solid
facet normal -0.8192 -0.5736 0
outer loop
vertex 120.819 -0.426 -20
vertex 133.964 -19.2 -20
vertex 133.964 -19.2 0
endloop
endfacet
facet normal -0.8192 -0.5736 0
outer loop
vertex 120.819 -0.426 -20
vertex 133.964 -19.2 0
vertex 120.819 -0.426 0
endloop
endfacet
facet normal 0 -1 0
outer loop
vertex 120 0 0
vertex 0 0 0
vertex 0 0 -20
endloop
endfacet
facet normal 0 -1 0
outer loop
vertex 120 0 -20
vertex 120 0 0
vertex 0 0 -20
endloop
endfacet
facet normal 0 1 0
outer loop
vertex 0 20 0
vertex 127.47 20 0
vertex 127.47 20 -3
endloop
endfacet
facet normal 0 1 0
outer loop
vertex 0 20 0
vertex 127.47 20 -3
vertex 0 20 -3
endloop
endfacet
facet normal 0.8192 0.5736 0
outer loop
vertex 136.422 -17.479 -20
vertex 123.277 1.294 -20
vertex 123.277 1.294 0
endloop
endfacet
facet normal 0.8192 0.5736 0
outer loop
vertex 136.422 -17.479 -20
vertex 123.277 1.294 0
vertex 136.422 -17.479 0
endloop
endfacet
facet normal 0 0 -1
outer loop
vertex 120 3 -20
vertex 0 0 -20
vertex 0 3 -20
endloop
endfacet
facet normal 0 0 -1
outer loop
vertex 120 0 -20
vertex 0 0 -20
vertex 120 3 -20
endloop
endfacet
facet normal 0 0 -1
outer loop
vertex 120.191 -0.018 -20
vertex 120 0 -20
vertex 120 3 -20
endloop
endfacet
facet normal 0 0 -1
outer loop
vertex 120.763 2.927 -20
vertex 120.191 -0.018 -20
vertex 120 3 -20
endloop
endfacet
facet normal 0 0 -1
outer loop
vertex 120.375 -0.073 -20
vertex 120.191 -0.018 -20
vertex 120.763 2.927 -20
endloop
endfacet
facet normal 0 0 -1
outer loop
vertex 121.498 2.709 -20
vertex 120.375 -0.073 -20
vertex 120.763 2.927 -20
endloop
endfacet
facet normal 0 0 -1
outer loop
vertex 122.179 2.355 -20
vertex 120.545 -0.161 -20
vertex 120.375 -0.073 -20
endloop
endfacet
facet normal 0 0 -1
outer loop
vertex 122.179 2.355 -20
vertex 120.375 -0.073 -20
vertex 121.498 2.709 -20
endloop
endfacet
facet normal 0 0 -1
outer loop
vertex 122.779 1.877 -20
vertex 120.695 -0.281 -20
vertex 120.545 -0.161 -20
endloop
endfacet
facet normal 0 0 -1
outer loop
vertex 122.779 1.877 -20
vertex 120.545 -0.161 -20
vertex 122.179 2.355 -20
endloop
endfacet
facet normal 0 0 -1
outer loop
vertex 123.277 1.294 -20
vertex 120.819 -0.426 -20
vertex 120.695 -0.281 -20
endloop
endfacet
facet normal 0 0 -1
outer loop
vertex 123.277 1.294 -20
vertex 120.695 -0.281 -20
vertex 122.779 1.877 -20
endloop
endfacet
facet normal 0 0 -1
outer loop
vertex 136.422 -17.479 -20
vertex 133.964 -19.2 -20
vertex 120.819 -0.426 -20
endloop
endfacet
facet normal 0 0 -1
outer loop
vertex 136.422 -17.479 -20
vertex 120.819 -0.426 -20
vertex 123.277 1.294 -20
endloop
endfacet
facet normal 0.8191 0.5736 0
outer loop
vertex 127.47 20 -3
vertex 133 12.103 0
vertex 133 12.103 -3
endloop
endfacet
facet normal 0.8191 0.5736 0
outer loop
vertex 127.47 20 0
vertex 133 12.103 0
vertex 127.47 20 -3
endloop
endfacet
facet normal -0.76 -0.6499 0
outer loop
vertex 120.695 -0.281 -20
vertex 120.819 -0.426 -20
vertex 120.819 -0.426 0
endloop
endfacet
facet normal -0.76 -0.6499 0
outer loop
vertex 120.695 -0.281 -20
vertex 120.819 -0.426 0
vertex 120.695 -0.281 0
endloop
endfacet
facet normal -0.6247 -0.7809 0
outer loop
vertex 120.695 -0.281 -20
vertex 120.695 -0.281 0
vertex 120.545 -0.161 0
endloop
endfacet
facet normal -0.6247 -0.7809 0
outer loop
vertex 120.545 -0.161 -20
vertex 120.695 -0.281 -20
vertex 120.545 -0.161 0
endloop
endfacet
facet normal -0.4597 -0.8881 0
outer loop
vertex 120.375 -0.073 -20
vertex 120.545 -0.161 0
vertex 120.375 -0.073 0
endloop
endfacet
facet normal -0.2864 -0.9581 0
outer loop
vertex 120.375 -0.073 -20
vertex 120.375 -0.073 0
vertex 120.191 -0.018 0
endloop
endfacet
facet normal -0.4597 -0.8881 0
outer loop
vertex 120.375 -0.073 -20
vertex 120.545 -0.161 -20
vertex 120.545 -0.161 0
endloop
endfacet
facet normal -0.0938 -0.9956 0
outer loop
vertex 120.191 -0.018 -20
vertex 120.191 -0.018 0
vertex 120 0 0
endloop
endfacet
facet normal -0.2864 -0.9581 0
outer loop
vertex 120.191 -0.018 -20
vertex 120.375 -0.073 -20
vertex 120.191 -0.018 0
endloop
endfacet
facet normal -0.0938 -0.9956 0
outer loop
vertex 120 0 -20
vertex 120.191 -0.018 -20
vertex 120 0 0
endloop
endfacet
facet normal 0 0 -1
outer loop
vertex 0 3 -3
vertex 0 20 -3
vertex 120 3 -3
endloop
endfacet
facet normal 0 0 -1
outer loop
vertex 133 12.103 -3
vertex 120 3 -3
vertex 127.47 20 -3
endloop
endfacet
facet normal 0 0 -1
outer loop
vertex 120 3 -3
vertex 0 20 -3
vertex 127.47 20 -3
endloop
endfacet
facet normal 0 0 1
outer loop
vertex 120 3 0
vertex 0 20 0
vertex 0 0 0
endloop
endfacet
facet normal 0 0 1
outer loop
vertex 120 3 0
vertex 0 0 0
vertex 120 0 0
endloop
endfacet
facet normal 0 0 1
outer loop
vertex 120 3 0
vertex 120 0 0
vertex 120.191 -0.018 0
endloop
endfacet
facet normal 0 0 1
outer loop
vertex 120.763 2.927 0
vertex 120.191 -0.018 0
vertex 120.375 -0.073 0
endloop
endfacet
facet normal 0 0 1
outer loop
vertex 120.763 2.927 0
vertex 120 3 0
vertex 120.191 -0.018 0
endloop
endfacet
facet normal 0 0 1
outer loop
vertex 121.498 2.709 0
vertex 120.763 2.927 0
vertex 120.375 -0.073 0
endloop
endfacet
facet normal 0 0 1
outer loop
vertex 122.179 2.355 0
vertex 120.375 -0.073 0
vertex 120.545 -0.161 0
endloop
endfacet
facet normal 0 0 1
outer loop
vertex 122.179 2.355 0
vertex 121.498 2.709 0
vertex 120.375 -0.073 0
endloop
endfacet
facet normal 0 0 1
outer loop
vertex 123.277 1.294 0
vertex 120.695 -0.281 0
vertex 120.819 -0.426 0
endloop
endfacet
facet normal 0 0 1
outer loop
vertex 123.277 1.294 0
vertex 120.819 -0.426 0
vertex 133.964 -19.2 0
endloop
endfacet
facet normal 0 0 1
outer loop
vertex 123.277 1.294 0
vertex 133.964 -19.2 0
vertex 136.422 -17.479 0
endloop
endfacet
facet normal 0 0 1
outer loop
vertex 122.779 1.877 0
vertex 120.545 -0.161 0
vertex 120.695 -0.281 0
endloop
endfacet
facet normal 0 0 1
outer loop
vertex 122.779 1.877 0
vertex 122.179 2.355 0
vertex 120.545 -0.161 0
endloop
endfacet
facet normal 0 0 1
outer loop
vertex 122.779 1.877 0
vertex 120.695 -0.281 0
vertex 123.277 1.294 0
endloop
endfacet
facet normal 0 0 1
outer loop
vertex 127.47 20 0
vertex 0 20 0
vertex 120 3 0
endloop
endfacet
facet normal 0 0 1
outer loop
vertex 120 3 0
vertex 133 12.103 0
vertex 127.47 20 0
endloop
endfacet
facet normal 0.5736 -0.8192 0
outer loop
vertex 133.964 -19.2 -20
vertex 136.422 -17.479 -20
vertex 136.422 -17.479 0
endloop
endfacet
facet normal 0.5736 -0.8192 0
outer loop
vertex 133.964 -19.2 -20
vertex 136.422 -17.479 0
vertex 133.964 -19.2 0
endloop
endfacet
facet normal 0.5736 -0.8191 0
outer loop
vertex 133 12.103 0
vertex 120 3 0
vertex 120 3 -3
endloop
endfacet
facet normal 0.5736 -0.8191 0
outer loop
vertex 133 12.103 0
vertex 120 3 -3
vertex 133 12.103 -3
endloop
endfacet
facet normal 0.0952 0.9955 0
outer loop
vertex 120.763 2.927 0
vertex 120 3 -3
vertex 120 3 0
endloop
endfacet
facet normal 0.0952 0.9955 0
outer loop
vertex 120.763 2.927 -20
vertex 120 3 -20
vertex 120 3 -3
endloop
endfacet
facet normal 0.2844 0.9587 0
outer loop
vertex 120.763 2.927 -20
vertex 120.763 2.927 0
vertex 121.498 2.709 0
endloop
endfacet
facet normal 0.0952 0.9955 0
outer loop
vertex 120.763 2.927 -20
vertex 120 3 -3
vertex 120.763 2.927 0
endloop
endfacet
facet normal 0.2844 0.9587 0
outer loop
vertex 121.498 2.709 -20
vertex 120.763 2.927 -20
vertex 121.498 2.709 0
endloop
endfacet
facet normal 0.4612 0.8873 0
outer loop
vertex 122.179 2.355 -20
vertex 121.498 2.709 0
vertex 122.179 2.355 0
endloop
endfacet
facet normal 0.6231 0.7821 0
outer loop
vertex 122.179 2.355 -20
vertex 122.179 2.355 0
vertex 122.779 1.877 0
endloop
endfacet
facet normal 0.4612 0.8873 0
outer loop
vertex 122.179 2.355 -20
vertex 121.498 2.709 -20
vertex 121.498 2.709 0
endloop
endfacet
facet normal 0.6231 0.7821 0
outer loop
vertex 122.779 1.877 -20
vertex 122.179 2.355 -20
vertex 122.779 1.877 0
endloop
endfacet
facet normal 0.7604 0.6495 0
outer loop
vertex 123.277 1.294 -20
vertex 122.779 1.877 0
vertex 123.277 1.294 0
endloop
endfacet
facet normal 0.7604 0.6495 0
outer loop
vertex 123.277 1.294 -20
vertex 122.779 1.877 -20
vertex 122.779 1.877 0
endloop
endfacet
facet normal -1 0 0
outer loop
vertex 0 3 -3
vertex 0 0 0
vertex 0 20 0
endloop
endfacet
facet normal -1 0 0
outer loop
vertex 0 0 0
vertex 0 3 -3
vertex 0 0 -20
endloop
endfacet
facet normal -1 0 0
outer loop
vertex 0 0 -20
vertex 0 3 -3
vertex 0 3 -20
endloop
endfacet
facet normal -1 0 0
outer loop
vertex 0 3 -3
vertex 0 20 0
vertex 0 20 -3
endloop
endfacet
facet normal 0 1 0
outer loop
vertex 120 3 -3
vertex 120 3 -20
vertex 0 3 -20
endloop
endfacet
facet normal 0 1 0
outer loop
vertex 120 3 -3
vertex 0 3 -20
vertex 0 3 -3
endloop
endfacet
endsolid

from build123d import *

# Parameters (mm, degrees)
EXTRUDE_1_DEPTH        = 120
SKETCH_3_W             = 120
SKETCH_3_H             = 20
SM_BASE_FLANGE_1_DEPTH = 3
SM_EDGE_FLANGE_2_DEPTH = 20
EXTRUDE_1_2_DEPTH      = 3


# Sheet-metal steps are written as plain solids
with BuildPart() as part:
    # Sketch 1 → Extrude 1 (new body)
    with BuildSketch(Plane(origin=(0, 0, 0), x_dir=(0, 0, -1), z_dir=(1, 0, 0))):
        Polygon((0, 20), (0, 0), (20, 0), (20, 3), (3, 3), (3, 20), align=None)
    extrude(amount=EXTRUDE_1_DEPTH)



with BuildPart() as body_2:
    # Эскиз3 → Базовая кромка1 (new body)
    with BuildSketch(Plane.XZ):
        with Locations((60, -10)):
            Rectangle(SKETCH_3_W, SKETCH_3_H)
    extrude(amount=-SM_BASE_FLANGE_1_DEPTH)

    # Ребро-кромка2 section (across the edge) → Ребро-кромка2 (add)
    with BuildSketch(Plane(origin=(120.520567051, 0, -20), x_dir=(-0.8191520442889889, -0.5735764363510502, 0), z_dir=(0, 0, 1))):
        with BuildLine():
            Line((-3, 0.520567051), (-3, 23.438298848))
            Line((-3, 23.438298848), (0, 23.438298848))
            Line((0, 23.438298848), (0, 0.520567051))
            ThreePointArc((0, 0.520567051), (0.112989167, 0.058818437), (0.426423564, -0.298584994))
            Line((0.426423564, -0.298584994), (-1.294305745, -2.756041127))
            ThreePointArc((-1.294305745, -2.756041127), (-2.548043333, -1.326427402), (-3, 0.520567051))
        make_face()
    extrude(amount=SM_EDGE_FLANGE_2_DEPTH)


with BuildPart() as part_1:
    add(part.part)

    add(body_2.part)  # Extrude 1 2 merges body 2
    # Эскиз10 → Extrude 1 2 (add)
    with BuildSketch(Plane.XY):
        Polygon((120, 20), (120, 3), (133, 12.102697997), (127.470249606, 20), align=None)
    extrude(amount=-EXTRUDE_1_2_DEPTH)


solid = part_1.part
